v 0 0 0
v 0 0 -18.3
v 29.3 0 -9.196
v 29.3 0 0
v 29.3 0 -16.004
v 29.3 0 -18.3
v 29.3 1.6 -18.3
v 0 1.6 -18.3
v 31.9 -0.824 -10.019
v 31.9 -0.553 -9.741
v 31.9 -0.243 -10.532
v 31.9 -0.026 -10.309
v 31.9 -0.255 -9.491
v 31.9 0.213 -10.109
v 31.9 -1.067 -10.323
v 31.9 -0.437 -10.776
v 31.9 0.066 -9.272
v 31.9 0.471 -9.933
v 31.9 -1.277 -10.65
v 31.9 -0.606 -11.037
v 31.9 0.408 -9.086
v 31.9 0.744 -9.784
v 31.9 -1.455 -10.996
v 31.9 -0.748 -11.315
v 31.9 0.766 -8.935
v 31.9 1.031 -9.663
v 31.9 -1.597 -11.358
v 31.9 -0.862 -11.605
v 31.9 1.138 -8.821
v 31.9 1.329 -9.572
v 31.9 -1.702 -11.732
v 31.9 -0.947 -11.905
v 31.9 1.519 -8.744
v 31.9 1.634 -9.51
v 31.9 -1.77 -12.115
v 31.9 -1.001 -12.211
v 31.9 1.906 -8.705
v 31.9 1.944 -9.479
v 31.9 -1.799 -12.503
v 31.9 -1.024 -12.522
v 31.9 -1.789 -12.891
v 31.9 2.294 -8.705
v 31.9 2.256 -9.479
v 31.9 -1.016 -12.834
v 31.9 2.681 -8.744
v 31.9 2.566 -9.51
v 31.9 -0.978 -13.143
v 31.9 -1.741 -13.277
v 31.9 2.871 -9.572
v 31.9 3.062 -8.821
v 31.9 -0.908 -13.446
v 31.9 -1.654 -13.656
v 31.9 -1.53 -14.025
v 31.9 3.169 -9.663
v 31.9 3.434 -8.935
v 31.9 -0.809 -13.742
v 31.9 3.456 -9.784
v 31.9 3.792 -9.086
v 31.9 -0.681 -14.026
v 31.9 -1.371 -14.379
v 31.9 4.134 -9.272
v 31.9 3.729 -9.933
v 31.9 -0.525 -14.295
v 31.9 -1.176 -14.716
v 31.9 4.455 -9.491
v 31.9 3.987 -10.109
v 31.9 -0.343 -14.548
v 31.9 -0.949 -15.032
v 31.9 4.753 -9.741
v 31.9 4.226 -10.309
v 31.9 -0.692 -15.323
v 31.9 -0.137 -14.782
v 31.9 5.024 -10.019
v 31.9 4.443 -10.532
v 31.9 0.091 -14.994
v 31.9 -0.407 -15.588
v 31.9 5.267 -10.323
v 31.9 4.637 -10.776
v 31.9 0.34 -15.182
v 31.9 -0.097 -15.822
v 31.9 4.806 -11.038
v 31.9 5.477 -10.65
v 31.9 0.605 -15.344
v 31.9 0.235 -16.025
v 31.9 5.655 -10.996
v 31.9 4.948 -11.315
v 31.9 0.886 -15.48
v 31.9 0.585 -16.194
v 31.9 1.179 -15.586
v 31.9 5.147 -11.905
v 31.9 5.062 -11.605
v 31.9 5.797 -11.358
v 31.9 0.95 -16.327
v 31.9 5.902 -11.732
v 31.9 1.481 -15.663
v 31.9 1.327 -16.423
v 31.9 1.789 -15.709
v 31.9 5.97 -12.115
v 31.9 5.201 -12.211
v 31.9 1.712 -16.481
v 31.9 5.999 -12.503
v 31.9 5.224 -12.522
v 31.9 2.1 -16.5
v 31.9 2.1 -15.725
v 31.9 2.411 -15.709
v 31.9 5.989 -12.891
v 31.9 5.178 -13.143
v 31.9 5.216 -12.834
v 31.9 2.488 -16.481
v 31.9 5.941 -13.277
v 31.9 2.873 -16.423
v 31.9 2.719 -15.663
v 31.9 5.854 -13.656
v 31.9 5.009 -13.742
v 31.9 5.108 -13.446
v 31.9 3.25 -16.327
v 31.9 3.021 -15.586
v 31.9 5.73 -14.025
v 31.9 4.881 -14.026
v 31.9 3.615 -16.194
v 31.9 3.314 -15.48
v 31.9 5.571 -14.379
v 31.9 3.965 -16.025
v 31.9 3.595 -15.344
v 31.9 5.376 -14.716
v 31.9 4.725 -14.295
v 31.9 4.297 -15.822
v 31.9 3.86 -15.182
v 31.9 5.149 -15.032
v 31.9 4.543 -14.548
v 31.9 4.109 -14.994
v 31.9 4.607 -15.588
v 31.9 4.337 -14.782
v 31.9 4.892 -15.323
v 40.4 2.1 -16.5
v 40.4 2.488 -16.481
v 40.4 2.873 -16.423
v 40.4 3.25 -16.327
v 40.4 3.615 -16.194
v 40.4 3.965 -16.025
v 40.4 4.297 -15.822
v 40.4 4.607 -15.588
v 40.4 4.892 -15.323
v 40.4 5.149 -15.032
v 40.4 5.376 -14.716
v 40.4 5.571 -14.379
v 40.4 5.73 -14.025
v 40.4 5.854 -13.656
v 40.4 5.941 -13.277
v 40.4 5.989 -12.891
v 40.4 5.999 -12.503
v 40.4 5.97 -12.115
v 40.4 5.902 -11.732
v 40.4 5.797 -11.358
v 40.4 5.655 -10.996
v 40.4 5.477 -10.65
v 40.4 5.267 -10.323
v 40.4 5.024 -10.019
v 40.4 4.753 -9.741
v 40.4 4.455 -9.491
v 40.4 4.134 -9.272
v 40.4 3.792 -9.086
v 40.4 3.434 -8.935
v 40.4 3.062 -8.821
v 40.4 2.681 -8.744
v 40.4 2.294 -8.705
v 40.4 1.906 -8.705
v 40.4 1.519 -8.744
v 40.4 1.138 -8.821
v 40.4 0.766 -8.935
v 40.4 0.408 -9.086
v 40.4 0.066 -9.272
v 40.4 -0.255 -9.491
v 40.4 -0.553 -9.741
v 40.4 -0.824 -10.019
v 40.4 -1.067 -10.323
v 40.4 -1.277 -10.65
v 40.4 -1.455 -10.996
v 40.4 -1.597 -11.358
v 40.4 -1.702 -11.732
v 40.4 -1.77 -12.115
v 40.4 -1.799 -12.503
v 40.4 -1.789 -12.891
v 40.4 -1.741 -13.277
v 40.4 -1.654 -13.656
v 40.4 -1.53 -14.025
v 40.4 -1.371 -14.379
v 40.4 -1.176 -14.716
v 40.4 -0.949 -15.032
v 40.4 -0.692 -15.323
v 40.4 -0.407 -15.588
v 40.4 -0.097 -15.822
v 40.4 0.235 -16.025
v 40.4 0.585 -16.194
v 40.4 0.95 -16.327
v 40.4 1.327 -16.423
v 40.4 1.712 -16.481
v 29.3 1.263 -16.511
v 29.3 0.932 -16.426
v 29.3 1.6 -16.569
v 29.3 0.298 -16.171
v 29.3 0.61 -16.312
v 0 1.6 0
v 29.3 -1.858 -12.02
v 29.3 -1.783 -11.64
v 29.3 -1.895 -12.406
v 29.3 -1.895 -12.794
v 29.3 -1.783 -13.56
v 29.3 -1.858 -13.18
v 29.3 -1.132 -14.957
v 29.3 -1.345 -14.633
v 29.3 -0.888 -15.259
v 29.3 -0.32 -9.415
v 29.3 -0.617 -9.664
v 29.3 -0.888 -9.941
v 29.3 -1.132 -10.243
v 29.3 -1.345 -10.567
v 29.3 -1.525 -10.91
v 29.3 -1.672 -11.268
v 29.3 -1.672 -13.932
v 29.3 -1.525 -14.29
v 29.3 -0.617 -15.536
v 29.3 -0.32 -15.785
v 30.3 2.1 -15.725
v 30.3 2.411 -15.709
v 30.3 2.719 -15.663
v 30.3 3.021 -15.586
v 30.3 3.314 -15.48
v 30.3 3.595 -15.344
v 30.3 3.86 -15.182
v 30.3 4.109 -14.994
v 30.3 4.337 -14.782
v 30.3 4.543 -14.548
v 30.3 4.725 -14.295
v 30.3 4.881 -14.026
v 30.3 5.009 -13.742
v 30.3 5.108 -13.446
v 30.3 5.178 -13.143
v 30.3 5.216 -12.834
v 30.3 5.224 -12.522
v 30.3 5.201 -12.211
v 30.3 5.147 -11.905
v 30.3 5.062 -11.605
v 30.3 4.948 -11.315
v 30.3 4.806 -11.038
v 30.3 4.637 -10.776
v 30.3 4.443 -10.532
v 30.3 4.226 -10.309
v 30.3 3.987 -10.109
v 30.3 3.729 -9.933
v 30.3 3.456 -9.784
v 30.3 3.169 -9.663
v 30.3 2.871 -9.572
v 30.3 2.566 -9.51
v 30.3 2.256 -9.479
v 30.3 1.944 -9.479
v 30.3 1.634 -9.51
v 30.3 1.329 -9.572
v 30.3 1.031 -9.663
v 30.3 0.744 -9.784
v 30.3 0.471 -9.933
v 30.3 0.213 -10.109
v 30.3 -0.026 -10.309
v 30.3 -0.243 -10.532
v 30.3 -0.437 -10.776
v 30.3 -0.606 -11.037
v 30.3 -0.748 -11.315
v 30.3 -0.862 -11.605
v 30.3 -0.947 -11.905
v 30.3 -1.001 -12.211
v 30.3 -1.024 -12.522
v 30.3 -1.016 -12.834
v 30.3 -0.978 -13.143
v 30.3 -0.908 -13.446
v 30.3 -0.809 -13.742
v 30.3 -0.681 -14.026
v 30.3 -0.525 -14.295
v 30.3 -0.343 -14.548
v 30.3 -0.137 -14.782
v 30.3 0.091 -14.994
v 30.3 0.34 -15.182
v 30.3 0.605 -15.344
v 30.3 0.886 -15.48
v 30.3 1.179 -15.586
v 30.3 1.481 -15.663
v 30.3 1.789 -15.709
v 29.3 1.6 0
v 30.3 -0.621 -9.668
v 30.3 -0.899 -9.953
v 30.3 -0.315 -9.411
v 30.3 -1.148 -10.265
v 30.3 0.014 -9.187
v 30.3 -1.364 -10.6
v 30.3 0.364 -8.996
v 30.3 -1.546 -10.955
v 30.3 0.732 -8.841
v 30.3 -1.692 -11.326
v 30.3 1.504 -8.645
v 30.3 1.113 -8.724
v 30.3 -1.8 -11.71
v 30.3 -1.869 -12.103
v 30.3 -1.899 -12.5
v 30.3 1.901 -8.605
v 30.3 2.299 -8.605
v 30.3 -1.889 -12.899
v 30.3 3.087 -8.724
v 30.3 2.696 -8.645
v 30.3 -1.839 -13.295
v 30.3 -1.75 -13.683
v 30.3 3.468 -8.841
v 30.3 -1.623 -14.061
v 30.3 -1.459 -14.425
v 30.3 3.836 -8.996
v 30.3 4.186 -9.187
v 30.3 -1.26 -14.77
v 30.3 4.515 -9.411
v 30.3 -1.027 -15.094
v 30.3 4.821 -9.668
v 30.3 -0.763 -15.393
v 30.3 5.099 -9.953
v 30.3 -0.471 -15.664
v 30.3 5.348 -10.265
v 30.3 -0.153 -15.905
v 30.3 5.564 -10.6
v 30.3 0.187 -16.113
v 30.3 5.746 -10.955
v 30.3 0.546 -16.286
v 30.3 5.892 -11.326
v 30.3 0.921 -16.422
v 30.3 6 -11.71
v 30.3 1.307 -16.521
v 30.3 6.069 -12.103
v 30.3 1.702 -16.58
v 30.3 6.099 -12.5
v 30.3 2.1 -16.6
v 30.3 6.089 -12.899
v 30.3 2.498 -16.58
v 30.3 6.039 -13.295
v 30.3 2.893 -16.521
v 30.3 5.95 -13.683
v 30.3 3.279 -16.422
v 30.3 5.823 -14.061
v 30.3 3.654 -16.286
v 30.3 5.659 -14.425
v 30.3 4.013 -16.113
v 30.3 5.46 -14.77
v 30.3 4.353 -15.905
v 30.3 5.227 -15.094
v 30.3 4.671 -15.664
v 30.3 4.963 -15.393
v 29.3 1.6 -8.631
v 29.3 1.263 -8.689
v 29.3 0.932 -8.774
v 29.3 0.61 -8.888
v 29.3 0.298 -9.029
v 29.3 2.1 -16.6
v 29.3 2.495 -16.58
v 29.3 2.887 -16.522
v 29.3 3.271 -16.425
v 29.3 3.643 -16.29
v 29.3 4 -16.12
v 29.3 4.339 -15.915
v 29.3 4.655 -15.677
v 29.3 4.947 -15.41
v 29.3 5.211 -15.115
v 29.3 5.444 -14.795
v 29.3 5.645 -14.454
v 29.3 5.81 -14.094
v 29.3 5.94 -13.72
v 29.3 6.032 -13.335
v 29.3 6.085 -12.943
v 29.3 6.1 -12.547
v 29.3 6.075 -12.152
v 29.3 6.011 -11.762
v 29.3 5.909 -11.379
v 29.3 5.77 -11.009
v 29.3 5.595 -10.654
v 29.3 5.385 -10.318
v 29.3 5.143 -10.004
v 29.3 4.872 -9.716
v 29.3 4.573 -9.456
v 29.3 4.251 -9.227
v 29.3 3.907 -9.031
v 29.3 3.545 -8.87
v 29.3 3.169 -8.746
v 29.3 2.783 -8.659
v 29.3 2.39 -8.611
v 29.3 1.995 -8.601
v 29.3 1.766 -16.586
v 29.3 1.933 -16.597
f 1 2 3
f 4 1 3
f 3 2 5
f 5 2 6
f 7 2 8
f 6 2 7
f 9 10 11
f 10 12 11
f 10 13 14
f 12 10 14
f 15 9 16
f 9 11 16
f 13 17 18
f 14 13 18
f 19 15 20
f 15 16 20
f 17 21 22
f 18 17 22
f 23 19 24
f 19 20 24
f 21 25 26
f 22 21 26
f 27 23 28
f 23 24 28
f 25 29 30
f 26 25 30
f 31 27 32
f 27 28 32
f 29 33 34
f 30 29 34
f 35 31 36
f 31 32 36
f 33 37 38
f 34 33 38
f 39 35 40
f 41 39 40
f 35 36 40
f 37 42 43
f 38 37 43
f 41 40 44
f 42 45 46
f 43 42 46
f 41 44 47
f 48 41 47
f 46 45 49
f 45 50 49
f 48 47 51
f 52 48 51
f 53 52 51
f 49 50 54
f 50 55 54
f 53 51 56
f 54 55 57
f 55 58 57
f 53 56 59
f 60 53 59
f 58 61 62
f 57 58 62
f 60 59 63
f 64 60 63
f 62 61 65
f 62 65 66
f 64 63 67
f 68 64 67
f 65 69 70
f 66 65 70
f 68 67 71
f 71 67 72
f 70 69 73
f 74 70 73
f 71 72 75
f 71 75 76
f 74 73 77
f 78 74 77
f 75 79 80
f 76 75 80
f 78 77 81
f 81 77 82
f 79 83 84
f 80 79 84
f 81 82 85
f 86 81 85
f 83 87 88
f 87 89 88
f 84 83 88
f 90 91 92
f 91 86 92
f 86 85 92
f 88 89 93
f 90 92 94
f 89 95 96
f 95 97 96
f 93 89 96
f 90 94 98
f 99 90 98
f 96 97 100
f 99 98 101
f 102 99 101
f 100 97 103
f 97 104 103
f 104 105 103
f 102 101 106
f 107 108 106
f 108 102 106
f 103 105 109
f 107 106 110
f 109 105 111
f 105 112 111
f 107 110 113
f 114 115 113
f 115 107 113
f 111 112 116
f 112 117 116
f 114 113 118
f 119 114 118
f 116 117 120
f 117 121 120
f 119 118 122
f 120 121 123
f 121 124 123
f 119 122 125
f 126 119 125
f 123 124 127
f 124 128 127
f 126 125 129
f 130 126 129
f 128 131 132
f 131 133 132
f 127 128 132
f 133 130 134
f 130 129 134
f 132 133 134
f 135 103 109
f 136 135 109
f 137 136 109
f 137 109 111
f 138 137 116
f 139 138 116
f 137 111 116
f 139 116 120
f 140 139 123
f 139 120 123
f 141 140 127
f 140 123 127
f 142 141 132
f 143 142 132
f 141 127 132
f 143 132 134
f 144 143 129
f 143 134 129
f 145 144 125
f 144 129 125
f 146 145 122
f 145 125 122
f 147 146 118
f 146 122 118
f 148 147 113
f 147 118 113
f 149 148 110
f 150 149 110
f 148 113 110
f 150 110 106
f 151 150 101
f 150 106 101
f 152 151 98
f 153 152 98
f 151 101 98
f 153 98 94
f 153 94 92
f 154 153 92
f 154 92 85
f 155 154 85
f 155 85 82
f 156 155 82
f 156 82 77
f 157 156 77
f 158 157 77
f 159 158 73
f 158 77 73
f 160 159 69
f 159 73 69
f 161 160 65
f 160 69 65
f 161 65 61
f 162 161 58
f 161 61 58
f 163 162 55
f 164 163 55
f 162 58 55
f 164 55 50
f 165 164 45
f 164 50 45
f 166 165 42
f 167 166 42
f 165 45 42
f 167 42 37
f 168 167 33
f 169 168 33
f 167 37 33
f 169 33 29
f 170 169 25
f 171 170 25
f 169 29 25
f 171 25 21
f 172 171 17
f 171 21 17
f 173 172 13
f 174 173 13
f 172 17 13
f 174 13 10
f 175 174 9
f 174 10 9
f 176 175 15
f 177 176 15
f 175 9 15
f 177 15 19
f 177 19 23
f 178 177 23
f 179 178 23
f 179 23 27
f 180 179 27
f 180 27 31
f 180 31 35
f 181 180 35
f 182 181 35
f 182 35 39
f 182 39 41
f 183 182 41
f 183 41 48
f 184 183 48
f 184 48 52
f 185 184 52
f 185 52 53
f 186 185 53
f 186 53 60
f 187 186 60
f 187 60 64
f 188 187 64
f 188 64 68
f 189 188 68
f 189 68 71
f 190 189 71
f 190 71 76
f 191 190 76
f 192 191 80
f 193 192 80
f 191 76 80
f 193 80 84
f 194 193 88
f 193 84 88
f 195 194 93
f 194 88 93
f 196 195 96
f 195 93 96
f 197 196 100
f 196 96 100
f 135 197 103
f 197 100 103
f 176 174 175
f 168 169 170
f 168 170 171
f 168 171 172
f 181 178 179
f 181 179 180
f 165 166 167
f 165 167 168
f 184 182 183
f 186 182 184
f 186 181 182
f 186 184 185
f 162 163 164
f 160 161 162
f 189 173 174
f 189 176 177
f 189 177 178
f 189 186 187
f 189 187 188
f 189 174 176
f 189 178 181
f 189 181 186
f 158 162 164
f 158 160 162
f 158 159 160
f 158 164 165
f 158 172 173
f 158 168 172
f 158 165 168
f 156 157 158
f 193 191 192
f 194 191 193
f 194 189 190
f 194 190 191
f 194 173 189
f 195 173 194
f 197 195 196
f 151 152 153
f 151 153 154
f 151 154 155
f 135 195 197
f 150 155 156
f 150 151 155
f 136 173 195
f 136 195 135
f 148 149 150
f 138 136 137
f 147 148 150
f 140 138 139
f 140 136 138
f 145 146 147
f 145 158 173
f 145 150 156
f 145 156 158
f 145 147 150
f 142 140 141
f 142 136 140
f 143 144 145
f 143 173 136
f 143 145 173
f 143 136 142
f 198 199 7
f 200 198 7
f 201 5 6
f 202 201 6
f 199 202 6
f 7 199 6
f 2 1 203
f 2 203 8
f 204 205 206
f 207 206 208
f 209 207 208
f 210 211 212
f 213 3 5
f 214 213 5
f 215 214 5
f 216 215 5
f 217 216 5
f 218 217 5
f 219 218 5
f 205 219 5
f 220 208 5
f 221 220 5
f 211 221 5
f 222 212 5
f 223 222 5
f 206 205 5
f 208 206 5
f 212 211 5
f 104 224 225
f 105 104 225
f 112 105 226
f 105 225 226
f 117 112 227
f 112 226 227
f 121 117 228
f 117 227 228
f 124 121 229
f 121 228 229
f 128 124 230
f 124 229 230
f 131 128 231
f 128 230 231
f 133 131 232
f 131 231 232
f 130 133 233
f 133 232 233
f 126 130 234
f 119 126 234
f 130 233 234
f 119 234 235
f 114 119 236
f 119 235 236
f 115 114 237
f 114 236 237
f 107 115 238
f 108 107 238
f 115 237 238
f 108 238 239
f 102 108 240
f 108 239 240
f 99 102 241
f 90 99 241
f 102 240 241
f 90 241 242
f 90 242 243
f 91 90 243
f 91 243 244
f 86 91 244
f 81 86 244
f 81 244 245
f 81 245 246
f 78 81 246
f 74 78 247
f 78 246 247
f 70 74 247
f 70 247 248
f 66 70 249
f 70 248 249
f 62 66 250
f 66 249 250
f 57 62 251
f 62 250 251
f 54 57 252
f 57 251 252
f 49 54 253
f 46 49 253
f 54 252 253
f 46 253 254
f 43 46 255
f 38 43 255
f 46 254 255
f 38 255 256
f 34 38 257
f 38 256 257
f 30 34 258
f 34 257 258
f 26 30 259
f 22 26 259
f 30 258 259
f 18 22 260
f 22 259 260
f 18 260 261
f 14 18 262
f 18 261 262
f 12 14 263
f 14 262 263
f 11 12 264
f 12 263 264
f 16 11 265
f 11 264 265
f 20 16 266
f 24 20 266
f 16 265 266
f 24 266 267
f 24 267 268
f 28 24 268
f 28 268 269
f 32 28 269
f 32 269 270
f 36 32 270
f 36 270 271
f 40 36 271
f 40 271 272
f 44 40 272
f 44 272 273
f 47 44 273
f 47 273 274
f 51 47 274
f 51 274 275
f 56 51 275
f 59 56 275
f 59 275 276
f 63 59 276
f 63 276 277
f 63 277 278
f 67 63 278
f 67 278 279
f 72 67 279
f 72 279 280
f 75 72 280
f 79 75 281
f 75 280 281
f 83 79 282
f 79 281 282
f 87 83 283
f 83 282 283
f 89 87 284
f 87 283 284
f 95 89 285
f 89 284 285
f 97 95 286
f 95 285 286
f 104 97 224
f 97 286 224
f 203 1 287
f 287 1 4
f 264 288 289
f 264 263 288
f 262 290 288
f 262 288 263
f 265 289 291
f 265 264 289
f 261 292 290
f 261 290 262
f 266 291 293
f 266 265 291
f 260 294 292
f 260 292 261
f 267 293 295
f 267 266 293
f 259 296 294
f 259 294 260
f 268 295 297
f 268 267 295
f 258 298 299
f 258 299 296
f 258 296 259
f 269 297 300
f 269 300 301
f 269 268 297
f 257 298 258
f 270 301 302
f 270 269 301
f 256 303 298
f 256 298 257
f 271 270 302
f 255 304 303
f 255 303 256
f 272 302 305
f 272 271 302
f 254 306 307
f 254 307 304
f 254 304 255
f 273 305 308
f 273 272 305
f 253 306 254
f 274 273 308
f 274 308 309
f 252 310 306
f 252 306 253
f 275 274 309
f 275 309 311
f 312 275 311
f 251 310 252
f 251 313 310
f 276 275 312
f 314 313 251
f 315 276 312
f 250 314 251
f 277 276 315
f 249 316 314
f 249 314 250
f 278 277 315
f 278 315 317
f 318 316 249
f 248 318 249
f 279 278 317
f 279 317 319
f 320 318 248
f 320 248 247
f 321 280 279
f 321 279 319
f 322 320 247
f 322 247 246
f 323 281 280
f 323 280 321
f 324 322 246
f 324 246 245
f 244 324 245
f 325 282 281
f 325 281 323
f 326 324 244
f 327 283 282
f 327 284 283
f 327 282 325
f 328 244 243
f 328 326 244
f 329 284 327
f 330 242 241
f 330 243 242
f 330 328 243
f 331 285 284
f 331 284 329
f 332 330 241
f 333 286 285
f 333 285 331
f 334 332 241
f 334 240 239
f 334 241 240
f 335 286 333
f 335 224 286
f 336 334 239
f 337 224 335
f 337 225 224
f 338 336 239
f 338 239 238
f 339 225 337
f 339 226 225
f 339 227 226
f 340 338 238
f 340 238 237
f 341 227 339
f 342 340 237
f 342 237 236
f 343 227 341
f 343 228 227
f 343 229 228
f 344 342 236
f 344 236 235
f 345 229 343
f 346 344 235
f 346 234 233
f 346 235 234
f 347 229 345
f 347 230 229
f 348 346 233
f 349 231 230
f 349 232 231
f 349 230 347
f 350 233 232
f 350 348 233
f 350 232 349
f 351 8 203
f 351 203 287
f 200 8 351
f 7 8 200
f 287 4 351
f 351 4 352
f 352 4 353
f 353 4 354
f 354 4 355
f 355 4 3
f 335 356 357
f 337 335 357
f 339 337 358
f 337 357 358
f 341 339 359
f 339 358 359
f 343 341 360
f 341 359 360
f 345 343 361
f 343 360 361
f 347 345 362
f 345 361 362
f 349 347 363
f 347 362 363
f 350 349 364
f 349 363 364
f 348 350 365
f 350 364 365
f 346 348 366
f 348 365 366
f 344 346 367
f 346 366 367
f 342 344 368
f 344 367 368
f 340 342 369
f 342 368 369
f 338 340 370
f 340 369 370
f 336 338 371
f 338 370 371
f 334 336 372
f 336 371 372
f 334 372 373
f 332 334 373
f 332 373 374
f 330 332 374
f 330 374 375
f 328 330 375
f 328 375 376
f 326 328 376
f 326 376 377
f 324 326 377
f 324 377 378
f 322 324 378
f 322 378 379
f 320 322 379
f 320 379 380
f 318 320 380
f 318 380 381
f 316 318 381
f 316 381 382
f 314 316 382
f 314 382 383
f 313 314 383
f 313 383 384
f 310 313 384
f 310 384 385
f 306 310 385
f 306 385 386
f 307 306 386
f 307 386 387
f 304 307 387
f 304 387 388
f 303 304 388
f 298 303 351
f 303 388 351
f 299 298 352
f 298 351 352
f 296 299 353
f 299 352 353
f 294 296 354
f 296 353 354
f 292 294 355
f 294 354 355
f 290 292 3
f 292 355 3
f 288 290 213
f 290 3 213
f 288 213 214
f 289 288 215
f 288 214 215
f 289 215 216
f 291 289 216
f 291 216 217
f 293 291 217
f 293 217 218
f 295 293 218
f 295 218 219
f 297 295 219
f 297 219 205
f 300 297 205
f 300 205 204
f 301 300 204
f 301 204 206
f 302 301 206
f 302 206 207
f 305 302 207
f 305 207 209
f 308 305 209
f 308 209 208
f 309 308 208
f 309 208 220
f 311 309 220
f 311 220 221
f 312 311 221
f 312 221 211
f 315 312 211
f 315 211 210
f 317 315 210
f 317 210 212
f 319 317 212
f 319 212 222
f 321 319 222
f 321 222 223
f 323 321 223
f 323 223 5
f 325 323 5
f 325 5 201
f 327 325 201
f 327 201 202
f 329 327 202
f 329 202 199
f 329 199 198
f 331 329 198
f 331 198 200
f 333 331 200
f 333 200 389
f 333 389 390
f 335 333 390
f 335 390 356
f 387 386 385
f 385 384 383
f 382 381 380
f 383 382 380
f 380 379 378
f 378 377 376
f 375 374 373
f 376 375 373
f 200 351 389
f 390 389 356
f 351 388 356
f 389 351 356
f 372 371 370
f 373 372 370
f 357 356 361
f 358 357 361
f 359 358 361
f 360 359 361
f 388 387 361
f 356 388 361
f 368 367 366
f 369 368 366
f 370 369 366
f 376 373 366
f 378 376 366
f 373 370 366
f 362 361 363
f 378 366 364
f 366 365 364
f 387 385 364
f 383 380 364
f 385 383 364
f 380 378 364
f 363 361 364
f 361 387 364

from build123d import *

# Parameters (mm, degrees)
SKETCH2_W           = 29.3
SKETCH2_H           = 18.3
BOSS_EXTRUDE1_DEPTH = 1.6
SKETCH3_R           = 4
BOSS_EXTRUDE2_DEPTH = 1
SKETCH4_R           = 3.125
BOSS_EXTRUDE3_DEPTH = 1.6
SKETCH5_R           = 3.9
BOSS_EXTRUDE4_DEPTH = 8.5


with BuildPart() as part:
    # Sketch2 → Boss-Extrude1 (new body)
    with BuildSketch(Plane(origin=(0, 0, 0), x_dir=(1, 0, 0), z_dir=(0, 1, 0))):
        with Locations((14.65, 9.15)):
            Rectangle(SKETCH2_W, SKETCH2_H)
    extrude(amount=BOSS_EXTRUDE1_DEPTH)

    # Sketch3 → Boss-Extrude2 (add)
    with BuildSketch(Plane(origin=(29.3, 0, 0), x_dir=(0, 0, -1), z_dir=(1, 0, 0))):
        with Locations((12.6, 2.1)):
            Circle(SKETCH3_R)
    extrude(amount=BOSS_EXTRUDE2_DEPTH)

    # Sketch4 → Boss-Extrude3 (add)
    with BuildSketch(Plane(origin=(30.3, 0, 0), x_dir=(0, 0, -1), z_dir=(1, 0, 0))):
        with Locations((12.6, 2.1)):
            Circle(SKETCH4_R)
    extrude(amount=BOSS_EXTRUDE3_DEPTH)

    # Sketch5 → Boss-Extrude4 (add)
    with BuildSketch(Plane(origin=(31.9, 0, 0), x_dir=(0, 0, -1), z_dir=(1, 0, 0))):
        with Locations((12.6, 2.1)):
            Circle(SKETCH5_R)
    extrude(amount=BOSS_EXTRUDE4_DEPTH)


solid = part.part
